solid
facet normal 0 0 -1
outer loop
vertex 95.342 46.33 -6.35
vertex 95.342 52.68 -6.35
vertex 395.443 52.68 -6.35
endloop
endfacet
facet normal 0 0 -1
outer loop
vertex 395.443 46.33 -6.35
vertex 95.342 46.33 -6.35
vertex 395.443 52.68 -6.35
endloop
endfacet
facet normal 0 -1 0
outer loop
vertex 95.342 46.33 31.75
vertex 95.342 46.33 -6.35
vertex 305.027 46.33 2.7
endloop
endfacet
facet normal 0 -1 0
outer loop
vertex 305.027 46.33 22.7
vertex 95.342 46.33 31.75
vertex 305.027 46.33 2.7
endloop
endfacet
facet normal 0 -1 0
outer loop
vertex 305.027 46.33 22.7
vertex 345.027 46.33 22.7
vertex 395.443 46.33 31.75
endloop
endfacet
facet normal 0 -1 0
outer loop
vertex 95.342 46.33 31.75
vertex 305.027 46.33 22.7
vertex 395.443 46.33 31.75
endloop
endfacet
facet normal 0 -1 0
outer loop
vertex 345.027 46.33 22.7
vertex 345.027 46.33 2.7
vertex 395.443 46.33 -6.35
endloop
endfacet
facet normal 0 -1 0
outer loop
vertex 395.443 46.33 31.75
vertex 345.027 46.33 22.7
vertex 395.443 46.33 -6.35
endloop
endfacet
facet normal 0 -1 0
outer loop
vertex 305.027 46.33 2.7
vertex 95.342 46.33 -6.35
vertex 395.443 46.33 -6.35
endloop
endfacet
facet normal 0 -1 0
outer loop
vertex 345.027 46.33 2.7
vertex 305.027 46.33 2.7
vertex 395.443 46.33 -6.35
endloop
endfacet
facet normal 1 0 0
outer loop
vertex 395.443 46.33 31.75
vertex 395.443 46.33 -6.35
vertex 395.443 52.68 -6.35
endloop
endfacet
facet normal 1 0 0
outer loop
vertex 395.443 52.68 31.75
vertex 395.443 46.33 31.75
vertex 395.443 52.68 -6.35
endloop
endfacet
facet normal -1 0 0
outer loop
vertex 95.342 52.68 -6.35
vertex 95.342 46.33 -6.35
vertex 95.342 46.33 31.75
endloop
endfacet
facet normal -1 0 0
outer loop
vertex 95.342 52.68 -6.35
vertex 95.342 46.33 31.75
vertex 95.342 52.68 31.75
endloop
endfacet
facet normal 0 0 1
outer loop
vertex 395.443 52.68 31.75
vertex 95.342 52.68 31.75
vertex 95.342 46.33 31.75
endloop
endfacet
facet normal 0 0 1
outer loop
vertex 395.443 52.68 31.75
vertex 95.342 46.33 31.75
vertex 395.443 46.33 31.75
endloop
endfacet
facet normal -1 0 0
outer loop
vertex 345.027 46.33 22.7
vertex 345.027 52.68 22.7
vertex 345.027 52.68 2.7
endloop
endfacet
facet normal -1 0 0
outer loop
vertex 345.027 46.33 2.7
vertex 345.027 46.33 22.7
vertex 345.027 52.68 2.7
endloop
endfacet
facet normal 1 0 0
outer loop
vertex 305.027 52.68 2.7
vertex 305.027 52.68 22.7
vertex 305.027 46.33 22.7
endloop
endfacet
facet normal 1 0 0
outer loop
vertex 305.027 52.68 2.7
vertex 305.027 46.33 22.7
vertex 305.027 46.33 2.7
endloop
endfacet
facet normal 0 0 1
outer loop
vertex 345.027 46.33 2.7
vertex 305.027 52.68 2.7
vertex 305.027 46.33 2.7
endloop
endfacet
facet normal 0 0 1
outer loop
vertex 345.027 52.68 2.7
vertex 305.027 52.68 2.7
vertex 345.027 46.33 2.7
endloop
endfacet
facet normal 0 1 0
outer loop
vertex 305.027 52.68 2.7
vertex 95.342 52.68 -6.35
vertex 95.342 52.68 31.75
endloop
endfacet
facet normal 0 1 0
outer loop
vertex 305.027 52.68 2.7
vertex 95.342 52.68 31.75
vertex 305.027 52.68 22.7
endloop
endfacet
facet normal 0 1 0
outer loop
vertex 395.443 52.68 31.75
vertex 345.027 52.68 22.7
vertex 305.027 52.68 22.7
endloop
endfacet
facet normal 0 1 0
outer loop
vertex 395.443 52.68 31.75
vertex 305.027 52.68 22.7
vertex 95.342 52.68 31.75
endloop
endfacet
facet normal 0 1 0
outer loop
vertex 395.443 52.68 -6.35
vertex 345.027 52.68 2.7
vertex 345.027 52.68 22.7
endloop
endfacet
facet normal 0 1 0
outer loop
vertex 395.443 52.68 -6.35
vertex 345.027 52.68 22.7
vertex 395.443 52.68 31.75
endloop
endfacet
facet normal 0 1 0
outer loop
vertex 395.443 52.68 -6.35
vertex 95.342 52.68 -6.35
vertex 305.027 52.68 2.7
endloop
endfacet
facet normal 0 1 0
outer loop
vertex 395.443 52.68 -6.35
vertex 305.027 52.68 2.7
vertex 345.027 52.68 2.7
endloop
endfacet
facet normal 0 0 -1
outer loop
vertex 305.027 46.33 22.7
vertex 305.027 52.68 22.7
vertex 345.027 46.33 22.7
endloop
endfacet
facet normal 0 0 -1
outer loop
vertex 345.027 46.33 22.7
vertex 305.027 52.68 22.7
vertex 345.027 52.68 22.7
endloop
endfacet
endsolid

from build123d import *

# Parameters (mm, degrees)
SKETCH1_W           = 300.101088838
SKETCH1_H           = 6.35
BOSS_EXTRUDE1_DEPTH = 38.1
SKETCH2_W           = 40
SKETCH2_H           = 20
CUT_EXTRUDE1_DEPTH  = 7.35


with BuildPart() as part:
    # Sketch1 → Boss-Extrude1 (new body)
    with BuildSketch(Plane.XY.offset(-6.35)):
        with Locations((245.392650566, 49.505069687)):
            Rectangle(SKETCH1_W, SKETCH1_H)
    extrude(amount=BOSS_EXTRUDE1_DEPTH)

    # Sketch2 → Cut-Extrude1 (cut, through all)
    with BuildSketch(Plane(origin=(0, 52.680069687, 0), x_dir=(1, 0, 0), z_dir=(0, 1, 0))):
        with Locations((325.026890103, -12.7)):
            Rectangle(SKETCH2_W, SKETCH2_H)
    extrude(amount=-CUT_EXTRUDE1_DEPTH, mode=Mode.SUBTRACT)


solid = part.part
